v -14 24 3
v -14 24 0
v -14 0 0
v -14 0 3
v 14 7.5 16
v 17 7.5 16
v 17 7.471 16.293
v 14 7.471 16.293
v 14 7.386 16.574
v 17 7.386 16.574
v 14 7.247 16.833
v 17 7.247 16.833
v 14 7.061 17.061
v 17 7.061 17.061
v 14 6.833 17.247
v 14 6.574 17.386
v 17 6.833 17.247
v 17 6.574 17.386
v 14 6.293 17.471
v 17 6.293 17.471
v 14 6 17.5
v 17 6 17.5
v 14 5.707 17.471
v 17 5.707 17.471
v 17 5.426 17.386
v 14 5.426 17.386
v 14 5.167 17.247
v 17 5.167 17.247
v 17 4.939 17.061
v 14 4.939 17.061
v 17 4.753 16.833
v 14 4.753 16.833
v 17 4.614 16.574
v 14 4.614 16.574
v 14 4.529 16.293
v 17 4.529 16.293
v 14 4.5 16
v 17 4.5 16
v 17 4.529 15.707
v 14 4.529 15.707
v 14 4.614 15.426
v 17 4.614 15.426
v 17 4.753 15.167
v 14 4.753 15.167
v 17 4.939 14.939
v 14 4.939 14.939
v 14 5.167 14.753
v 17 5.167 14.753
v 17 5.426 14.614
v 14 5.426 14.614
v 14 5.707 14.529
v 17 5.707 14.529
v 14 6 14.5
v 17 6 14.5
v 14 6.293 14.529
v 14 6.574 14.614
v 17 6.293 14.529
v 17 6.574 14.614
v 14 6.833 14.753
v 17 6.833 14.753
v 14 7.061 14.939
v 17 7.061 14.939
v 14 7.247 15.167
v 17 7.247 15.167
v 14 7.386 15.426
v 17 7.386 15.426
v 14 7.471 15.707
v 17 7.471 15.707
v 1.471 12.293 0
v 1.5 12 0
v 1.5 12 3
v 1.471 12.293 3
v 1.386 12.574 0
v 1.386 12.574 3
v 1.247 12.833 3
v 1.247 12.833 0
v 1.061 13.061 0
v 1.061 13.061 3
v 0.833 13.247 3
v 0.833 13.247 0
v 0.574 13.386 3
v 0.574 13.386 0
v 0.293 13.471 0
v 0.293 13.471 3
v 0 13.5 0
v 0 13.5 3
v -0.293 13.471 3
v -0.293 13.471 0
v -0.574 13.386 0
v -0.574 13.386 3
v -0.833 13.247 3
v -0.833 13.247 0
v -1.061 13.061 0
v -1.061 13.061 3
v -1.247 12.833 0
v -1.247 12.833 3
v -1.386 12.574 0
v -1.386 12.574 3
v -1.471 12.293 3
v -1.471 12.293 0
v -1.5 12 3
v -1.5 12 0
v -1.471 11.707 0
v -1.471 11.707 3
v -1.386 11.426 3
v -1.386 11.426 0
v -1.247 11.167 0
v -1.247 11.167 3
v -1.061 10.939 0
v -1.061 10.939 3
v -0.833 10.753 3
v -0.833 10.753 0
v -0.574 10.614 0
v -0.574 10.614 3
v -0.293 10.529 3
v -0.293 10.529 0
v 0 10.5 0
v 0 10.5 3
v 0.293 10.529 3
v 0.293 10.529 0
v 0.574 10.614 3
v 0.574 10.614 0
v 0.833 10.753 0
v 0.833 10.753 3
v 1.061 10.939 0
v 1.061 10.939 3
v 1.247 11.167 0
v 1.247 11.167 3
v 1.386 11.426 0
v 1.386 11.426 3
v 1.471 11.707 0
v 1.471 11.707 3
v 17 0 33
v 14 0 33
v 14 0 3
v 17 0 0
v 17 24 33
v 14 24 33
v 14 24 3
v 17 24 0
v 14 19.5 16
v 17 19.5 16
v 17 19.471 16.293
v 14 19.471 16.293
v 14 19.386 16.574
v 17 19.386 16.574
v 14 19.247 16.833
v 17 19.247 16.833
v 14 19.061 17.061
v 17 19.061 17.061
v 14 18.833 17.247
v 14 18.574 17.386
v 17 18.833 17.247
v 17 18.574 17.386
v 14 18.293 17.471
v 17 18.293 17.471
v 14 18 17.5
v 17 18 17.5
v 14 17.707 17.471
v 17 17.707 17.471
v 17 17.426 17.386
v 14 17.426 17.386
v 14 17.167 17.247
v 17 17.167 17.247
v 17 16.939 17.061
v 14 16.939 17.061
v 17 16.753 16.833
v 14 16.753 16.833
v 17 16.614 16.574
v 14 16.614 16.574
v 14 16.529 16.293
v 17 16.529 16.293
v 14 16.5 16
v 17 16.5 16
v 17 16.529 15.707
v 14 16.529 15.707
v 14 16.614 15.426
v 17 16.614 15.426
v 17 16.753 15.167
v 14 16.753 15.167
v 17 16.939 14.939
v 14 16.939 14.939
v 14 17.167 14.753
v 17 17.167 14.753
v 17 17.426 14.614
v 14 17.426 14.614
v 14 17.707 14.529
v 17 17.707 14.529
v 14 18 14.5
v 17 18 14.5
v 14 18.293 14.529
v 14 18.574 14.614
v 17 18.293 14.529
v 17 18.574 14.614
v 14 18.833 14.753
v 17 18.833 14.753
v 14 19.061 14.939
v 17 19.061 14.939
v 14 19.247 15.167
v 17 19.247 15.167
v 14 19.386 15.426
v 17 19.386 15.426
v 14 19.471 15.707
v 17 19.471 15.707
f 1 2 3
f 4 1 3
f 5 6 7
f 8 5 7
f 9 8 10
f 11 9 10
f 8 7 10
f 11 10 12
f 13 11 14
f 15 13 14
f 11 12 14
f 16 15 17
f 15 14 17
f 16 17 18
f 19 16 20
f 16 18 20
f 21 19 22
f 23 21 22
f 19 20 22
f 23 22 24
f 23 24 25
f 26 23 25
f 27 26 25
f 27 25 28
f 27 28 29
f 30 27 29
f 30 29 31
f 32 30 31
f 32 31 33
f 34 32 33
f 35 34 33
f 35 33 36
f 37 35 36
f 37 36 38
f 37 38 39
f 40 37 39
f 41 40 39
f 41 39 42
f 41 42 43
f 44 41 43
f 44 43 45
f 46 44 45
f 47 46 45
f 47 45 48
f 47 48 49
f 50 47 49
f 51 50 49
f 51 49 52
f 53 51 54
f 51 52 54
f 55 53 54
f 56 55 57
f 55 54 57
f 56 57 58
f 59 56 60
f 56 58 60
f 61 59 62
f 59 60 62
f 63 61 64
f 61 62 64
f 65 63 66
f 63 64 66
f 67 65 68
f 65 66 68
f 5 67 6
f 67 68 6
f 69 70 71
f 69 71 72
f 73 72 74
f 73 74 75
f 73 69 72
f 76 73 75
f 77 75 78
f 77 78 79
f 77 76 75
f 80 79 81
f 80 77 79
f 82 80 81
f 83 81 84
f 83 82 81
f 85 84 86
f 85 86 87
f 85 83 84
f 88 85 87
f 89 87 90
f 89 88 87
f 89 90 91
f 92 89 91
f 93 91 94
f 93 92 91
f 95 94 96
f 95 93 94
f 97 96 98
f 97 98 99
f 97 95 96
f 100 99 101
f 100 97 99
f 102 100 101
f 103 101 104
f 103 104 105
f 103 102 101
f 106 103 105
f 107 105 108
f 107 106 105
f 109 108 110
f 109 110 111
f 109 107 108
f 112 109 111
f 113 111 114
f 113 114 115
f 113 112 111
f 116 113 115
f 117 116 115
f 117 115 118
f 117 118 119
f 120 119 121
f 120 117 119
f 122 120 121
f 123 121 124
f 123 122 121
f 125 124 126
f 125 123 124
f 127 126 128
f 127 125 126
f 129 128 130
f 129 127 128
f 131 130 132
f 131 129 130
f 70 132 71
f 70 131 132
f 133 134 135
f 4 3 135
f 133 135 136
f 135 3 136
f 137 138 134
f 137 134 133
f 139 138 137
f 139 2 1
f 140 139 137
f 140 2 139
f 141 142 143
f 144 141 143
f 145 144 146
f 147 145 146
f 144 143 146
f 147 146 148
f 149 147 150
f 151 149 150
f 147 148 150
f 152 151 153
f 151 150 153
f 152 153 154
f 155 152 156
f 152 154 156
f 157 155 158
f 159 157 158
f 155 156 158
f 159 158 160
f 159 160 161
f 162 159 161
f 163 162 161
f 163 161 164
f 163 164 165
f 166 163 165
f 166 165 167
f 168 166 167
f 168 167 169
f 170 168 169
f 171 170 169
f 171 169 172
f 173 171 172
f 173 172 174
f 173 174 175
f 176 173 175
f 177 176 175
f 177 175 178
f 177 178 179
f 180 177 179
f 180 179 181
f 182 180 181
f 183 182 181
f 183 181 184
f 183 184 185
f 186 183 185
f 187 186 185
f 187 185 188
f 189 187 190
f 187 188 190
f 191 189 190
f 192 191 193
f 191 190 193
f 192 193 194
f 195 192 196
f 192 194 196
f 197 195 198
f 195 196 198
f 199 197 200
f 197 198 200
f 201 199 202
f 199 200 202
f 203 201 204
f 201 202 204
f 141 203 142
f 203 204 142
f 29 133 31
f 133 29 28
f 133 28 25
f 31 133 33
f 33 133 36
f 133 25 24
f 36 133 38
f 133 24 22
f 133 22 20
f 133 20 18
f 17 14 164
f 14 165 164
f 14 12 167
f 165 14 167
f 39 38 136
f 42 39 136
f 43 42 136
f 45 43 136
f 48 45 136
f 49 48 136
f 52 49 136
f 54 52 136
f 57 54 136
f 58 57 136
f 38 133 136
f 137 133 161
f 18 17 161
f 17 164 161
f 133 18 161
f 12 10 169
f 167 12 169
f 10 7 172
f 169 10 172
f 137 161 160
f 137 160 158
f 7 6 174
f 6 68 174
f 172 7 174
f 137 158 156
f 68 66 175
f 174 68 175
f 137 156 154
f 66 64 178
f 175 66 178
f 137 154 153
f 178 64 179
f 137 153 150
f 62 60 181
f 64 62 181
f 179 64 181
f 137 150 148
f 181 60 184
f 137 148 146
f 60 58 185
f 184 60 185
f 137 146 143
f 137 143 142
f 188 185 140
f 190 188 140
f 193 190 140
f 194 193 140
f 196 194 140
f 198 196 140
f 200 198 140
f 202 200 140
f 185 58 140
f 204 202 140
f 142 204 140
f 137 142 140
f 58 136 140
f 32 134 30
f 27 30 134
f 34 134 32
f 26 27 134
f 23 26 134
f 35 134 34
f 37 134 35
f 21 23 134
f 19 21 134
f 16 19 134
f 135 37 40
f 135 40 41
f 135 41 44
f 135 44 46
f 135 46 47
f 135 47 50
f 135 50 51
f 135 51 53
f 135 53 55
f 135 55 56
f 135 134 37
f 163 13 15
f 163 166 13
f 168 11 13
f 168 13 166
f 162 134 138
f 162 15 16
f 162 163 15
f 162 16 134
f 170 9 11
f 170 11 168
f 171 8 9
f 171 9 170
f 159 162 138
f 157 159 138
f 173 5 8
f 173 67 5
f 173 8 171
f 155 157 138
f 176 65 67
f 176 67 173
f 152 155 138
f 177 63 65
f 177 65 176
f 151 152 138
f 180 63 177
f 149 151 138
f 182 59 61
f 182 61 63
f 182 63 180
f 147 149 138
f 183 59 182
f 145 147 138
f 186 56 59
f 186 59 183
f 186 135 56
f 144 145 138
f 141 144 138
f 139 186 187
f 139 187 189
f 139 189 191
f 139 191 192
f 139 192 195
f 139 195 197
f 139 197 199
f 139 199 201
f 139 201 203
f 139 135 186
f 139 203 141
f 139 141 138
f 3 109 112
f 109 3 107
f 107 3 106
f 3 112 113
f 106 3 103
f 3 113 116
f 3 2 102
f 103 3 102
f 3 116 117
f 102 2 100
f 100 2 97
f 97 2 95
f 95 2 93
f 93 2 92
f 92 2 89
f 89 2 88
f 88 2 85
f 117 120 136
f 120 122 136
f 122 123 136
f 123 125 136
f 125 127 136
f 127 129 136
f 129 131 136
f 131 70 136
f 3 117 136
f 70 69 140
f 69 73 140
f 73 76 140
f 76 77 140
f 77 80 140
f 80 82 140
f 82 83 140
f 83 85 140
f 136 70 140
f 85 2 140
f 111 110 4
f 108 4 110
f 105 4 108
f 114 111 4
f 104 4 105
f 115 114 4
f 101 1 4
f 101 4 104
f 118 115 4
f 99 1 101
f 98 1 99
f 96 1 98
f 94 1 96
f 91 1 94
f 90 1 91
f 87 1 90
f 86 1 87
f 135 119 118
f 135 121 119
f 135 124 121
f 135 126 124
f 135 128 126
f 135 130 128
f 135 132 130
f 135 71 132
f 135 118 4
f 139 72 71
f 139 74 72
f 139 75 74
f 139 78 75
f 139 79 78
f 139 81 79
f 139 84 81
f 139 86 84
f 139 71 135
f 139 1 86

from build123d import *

# Parameters (mm, degrees)
F0_R     = 1.5
F1_DEPTH = 3
F2_W     = 3
F2_H     = 24
F3_DEPTH = 30
F4_R     = 1.5
F5_DEPTH = 25


with BuildPart() as f1:
    # F0 (on Top) → F1 (new body)
    with BuildSketch(Plane.XY):
        Polygon((-14, 0), (0, 0), (17, 0), (17, 24), (0, 24), (-14, 24), align=None)
        with Locations((0, 12)):
            Circle(F0_R, mode=Mode.SUBTRACT)
    extrude(amount=F1_DEPTH)

    # F2 (on face) → F3 (join)
    with BuildSketch(Plane.XY.offset(3)):
        with Locations((15.5, 12)):
            Rectangle(F2_W, F2_H)
    extrude(amount=F3_DEPTH)

    # F4 (on face) → F5 (cut)
    with BuildSketch(Plane.YZ.offset(17)):
        with Locations((6, 16)):
            Circle(F4_R)
        with Locations((18, 16)):
            Circle(F4_R)
    extrude(amount=-F5_DEPTH, mode=Mode.SUBTRACT)


solid = f1.part
